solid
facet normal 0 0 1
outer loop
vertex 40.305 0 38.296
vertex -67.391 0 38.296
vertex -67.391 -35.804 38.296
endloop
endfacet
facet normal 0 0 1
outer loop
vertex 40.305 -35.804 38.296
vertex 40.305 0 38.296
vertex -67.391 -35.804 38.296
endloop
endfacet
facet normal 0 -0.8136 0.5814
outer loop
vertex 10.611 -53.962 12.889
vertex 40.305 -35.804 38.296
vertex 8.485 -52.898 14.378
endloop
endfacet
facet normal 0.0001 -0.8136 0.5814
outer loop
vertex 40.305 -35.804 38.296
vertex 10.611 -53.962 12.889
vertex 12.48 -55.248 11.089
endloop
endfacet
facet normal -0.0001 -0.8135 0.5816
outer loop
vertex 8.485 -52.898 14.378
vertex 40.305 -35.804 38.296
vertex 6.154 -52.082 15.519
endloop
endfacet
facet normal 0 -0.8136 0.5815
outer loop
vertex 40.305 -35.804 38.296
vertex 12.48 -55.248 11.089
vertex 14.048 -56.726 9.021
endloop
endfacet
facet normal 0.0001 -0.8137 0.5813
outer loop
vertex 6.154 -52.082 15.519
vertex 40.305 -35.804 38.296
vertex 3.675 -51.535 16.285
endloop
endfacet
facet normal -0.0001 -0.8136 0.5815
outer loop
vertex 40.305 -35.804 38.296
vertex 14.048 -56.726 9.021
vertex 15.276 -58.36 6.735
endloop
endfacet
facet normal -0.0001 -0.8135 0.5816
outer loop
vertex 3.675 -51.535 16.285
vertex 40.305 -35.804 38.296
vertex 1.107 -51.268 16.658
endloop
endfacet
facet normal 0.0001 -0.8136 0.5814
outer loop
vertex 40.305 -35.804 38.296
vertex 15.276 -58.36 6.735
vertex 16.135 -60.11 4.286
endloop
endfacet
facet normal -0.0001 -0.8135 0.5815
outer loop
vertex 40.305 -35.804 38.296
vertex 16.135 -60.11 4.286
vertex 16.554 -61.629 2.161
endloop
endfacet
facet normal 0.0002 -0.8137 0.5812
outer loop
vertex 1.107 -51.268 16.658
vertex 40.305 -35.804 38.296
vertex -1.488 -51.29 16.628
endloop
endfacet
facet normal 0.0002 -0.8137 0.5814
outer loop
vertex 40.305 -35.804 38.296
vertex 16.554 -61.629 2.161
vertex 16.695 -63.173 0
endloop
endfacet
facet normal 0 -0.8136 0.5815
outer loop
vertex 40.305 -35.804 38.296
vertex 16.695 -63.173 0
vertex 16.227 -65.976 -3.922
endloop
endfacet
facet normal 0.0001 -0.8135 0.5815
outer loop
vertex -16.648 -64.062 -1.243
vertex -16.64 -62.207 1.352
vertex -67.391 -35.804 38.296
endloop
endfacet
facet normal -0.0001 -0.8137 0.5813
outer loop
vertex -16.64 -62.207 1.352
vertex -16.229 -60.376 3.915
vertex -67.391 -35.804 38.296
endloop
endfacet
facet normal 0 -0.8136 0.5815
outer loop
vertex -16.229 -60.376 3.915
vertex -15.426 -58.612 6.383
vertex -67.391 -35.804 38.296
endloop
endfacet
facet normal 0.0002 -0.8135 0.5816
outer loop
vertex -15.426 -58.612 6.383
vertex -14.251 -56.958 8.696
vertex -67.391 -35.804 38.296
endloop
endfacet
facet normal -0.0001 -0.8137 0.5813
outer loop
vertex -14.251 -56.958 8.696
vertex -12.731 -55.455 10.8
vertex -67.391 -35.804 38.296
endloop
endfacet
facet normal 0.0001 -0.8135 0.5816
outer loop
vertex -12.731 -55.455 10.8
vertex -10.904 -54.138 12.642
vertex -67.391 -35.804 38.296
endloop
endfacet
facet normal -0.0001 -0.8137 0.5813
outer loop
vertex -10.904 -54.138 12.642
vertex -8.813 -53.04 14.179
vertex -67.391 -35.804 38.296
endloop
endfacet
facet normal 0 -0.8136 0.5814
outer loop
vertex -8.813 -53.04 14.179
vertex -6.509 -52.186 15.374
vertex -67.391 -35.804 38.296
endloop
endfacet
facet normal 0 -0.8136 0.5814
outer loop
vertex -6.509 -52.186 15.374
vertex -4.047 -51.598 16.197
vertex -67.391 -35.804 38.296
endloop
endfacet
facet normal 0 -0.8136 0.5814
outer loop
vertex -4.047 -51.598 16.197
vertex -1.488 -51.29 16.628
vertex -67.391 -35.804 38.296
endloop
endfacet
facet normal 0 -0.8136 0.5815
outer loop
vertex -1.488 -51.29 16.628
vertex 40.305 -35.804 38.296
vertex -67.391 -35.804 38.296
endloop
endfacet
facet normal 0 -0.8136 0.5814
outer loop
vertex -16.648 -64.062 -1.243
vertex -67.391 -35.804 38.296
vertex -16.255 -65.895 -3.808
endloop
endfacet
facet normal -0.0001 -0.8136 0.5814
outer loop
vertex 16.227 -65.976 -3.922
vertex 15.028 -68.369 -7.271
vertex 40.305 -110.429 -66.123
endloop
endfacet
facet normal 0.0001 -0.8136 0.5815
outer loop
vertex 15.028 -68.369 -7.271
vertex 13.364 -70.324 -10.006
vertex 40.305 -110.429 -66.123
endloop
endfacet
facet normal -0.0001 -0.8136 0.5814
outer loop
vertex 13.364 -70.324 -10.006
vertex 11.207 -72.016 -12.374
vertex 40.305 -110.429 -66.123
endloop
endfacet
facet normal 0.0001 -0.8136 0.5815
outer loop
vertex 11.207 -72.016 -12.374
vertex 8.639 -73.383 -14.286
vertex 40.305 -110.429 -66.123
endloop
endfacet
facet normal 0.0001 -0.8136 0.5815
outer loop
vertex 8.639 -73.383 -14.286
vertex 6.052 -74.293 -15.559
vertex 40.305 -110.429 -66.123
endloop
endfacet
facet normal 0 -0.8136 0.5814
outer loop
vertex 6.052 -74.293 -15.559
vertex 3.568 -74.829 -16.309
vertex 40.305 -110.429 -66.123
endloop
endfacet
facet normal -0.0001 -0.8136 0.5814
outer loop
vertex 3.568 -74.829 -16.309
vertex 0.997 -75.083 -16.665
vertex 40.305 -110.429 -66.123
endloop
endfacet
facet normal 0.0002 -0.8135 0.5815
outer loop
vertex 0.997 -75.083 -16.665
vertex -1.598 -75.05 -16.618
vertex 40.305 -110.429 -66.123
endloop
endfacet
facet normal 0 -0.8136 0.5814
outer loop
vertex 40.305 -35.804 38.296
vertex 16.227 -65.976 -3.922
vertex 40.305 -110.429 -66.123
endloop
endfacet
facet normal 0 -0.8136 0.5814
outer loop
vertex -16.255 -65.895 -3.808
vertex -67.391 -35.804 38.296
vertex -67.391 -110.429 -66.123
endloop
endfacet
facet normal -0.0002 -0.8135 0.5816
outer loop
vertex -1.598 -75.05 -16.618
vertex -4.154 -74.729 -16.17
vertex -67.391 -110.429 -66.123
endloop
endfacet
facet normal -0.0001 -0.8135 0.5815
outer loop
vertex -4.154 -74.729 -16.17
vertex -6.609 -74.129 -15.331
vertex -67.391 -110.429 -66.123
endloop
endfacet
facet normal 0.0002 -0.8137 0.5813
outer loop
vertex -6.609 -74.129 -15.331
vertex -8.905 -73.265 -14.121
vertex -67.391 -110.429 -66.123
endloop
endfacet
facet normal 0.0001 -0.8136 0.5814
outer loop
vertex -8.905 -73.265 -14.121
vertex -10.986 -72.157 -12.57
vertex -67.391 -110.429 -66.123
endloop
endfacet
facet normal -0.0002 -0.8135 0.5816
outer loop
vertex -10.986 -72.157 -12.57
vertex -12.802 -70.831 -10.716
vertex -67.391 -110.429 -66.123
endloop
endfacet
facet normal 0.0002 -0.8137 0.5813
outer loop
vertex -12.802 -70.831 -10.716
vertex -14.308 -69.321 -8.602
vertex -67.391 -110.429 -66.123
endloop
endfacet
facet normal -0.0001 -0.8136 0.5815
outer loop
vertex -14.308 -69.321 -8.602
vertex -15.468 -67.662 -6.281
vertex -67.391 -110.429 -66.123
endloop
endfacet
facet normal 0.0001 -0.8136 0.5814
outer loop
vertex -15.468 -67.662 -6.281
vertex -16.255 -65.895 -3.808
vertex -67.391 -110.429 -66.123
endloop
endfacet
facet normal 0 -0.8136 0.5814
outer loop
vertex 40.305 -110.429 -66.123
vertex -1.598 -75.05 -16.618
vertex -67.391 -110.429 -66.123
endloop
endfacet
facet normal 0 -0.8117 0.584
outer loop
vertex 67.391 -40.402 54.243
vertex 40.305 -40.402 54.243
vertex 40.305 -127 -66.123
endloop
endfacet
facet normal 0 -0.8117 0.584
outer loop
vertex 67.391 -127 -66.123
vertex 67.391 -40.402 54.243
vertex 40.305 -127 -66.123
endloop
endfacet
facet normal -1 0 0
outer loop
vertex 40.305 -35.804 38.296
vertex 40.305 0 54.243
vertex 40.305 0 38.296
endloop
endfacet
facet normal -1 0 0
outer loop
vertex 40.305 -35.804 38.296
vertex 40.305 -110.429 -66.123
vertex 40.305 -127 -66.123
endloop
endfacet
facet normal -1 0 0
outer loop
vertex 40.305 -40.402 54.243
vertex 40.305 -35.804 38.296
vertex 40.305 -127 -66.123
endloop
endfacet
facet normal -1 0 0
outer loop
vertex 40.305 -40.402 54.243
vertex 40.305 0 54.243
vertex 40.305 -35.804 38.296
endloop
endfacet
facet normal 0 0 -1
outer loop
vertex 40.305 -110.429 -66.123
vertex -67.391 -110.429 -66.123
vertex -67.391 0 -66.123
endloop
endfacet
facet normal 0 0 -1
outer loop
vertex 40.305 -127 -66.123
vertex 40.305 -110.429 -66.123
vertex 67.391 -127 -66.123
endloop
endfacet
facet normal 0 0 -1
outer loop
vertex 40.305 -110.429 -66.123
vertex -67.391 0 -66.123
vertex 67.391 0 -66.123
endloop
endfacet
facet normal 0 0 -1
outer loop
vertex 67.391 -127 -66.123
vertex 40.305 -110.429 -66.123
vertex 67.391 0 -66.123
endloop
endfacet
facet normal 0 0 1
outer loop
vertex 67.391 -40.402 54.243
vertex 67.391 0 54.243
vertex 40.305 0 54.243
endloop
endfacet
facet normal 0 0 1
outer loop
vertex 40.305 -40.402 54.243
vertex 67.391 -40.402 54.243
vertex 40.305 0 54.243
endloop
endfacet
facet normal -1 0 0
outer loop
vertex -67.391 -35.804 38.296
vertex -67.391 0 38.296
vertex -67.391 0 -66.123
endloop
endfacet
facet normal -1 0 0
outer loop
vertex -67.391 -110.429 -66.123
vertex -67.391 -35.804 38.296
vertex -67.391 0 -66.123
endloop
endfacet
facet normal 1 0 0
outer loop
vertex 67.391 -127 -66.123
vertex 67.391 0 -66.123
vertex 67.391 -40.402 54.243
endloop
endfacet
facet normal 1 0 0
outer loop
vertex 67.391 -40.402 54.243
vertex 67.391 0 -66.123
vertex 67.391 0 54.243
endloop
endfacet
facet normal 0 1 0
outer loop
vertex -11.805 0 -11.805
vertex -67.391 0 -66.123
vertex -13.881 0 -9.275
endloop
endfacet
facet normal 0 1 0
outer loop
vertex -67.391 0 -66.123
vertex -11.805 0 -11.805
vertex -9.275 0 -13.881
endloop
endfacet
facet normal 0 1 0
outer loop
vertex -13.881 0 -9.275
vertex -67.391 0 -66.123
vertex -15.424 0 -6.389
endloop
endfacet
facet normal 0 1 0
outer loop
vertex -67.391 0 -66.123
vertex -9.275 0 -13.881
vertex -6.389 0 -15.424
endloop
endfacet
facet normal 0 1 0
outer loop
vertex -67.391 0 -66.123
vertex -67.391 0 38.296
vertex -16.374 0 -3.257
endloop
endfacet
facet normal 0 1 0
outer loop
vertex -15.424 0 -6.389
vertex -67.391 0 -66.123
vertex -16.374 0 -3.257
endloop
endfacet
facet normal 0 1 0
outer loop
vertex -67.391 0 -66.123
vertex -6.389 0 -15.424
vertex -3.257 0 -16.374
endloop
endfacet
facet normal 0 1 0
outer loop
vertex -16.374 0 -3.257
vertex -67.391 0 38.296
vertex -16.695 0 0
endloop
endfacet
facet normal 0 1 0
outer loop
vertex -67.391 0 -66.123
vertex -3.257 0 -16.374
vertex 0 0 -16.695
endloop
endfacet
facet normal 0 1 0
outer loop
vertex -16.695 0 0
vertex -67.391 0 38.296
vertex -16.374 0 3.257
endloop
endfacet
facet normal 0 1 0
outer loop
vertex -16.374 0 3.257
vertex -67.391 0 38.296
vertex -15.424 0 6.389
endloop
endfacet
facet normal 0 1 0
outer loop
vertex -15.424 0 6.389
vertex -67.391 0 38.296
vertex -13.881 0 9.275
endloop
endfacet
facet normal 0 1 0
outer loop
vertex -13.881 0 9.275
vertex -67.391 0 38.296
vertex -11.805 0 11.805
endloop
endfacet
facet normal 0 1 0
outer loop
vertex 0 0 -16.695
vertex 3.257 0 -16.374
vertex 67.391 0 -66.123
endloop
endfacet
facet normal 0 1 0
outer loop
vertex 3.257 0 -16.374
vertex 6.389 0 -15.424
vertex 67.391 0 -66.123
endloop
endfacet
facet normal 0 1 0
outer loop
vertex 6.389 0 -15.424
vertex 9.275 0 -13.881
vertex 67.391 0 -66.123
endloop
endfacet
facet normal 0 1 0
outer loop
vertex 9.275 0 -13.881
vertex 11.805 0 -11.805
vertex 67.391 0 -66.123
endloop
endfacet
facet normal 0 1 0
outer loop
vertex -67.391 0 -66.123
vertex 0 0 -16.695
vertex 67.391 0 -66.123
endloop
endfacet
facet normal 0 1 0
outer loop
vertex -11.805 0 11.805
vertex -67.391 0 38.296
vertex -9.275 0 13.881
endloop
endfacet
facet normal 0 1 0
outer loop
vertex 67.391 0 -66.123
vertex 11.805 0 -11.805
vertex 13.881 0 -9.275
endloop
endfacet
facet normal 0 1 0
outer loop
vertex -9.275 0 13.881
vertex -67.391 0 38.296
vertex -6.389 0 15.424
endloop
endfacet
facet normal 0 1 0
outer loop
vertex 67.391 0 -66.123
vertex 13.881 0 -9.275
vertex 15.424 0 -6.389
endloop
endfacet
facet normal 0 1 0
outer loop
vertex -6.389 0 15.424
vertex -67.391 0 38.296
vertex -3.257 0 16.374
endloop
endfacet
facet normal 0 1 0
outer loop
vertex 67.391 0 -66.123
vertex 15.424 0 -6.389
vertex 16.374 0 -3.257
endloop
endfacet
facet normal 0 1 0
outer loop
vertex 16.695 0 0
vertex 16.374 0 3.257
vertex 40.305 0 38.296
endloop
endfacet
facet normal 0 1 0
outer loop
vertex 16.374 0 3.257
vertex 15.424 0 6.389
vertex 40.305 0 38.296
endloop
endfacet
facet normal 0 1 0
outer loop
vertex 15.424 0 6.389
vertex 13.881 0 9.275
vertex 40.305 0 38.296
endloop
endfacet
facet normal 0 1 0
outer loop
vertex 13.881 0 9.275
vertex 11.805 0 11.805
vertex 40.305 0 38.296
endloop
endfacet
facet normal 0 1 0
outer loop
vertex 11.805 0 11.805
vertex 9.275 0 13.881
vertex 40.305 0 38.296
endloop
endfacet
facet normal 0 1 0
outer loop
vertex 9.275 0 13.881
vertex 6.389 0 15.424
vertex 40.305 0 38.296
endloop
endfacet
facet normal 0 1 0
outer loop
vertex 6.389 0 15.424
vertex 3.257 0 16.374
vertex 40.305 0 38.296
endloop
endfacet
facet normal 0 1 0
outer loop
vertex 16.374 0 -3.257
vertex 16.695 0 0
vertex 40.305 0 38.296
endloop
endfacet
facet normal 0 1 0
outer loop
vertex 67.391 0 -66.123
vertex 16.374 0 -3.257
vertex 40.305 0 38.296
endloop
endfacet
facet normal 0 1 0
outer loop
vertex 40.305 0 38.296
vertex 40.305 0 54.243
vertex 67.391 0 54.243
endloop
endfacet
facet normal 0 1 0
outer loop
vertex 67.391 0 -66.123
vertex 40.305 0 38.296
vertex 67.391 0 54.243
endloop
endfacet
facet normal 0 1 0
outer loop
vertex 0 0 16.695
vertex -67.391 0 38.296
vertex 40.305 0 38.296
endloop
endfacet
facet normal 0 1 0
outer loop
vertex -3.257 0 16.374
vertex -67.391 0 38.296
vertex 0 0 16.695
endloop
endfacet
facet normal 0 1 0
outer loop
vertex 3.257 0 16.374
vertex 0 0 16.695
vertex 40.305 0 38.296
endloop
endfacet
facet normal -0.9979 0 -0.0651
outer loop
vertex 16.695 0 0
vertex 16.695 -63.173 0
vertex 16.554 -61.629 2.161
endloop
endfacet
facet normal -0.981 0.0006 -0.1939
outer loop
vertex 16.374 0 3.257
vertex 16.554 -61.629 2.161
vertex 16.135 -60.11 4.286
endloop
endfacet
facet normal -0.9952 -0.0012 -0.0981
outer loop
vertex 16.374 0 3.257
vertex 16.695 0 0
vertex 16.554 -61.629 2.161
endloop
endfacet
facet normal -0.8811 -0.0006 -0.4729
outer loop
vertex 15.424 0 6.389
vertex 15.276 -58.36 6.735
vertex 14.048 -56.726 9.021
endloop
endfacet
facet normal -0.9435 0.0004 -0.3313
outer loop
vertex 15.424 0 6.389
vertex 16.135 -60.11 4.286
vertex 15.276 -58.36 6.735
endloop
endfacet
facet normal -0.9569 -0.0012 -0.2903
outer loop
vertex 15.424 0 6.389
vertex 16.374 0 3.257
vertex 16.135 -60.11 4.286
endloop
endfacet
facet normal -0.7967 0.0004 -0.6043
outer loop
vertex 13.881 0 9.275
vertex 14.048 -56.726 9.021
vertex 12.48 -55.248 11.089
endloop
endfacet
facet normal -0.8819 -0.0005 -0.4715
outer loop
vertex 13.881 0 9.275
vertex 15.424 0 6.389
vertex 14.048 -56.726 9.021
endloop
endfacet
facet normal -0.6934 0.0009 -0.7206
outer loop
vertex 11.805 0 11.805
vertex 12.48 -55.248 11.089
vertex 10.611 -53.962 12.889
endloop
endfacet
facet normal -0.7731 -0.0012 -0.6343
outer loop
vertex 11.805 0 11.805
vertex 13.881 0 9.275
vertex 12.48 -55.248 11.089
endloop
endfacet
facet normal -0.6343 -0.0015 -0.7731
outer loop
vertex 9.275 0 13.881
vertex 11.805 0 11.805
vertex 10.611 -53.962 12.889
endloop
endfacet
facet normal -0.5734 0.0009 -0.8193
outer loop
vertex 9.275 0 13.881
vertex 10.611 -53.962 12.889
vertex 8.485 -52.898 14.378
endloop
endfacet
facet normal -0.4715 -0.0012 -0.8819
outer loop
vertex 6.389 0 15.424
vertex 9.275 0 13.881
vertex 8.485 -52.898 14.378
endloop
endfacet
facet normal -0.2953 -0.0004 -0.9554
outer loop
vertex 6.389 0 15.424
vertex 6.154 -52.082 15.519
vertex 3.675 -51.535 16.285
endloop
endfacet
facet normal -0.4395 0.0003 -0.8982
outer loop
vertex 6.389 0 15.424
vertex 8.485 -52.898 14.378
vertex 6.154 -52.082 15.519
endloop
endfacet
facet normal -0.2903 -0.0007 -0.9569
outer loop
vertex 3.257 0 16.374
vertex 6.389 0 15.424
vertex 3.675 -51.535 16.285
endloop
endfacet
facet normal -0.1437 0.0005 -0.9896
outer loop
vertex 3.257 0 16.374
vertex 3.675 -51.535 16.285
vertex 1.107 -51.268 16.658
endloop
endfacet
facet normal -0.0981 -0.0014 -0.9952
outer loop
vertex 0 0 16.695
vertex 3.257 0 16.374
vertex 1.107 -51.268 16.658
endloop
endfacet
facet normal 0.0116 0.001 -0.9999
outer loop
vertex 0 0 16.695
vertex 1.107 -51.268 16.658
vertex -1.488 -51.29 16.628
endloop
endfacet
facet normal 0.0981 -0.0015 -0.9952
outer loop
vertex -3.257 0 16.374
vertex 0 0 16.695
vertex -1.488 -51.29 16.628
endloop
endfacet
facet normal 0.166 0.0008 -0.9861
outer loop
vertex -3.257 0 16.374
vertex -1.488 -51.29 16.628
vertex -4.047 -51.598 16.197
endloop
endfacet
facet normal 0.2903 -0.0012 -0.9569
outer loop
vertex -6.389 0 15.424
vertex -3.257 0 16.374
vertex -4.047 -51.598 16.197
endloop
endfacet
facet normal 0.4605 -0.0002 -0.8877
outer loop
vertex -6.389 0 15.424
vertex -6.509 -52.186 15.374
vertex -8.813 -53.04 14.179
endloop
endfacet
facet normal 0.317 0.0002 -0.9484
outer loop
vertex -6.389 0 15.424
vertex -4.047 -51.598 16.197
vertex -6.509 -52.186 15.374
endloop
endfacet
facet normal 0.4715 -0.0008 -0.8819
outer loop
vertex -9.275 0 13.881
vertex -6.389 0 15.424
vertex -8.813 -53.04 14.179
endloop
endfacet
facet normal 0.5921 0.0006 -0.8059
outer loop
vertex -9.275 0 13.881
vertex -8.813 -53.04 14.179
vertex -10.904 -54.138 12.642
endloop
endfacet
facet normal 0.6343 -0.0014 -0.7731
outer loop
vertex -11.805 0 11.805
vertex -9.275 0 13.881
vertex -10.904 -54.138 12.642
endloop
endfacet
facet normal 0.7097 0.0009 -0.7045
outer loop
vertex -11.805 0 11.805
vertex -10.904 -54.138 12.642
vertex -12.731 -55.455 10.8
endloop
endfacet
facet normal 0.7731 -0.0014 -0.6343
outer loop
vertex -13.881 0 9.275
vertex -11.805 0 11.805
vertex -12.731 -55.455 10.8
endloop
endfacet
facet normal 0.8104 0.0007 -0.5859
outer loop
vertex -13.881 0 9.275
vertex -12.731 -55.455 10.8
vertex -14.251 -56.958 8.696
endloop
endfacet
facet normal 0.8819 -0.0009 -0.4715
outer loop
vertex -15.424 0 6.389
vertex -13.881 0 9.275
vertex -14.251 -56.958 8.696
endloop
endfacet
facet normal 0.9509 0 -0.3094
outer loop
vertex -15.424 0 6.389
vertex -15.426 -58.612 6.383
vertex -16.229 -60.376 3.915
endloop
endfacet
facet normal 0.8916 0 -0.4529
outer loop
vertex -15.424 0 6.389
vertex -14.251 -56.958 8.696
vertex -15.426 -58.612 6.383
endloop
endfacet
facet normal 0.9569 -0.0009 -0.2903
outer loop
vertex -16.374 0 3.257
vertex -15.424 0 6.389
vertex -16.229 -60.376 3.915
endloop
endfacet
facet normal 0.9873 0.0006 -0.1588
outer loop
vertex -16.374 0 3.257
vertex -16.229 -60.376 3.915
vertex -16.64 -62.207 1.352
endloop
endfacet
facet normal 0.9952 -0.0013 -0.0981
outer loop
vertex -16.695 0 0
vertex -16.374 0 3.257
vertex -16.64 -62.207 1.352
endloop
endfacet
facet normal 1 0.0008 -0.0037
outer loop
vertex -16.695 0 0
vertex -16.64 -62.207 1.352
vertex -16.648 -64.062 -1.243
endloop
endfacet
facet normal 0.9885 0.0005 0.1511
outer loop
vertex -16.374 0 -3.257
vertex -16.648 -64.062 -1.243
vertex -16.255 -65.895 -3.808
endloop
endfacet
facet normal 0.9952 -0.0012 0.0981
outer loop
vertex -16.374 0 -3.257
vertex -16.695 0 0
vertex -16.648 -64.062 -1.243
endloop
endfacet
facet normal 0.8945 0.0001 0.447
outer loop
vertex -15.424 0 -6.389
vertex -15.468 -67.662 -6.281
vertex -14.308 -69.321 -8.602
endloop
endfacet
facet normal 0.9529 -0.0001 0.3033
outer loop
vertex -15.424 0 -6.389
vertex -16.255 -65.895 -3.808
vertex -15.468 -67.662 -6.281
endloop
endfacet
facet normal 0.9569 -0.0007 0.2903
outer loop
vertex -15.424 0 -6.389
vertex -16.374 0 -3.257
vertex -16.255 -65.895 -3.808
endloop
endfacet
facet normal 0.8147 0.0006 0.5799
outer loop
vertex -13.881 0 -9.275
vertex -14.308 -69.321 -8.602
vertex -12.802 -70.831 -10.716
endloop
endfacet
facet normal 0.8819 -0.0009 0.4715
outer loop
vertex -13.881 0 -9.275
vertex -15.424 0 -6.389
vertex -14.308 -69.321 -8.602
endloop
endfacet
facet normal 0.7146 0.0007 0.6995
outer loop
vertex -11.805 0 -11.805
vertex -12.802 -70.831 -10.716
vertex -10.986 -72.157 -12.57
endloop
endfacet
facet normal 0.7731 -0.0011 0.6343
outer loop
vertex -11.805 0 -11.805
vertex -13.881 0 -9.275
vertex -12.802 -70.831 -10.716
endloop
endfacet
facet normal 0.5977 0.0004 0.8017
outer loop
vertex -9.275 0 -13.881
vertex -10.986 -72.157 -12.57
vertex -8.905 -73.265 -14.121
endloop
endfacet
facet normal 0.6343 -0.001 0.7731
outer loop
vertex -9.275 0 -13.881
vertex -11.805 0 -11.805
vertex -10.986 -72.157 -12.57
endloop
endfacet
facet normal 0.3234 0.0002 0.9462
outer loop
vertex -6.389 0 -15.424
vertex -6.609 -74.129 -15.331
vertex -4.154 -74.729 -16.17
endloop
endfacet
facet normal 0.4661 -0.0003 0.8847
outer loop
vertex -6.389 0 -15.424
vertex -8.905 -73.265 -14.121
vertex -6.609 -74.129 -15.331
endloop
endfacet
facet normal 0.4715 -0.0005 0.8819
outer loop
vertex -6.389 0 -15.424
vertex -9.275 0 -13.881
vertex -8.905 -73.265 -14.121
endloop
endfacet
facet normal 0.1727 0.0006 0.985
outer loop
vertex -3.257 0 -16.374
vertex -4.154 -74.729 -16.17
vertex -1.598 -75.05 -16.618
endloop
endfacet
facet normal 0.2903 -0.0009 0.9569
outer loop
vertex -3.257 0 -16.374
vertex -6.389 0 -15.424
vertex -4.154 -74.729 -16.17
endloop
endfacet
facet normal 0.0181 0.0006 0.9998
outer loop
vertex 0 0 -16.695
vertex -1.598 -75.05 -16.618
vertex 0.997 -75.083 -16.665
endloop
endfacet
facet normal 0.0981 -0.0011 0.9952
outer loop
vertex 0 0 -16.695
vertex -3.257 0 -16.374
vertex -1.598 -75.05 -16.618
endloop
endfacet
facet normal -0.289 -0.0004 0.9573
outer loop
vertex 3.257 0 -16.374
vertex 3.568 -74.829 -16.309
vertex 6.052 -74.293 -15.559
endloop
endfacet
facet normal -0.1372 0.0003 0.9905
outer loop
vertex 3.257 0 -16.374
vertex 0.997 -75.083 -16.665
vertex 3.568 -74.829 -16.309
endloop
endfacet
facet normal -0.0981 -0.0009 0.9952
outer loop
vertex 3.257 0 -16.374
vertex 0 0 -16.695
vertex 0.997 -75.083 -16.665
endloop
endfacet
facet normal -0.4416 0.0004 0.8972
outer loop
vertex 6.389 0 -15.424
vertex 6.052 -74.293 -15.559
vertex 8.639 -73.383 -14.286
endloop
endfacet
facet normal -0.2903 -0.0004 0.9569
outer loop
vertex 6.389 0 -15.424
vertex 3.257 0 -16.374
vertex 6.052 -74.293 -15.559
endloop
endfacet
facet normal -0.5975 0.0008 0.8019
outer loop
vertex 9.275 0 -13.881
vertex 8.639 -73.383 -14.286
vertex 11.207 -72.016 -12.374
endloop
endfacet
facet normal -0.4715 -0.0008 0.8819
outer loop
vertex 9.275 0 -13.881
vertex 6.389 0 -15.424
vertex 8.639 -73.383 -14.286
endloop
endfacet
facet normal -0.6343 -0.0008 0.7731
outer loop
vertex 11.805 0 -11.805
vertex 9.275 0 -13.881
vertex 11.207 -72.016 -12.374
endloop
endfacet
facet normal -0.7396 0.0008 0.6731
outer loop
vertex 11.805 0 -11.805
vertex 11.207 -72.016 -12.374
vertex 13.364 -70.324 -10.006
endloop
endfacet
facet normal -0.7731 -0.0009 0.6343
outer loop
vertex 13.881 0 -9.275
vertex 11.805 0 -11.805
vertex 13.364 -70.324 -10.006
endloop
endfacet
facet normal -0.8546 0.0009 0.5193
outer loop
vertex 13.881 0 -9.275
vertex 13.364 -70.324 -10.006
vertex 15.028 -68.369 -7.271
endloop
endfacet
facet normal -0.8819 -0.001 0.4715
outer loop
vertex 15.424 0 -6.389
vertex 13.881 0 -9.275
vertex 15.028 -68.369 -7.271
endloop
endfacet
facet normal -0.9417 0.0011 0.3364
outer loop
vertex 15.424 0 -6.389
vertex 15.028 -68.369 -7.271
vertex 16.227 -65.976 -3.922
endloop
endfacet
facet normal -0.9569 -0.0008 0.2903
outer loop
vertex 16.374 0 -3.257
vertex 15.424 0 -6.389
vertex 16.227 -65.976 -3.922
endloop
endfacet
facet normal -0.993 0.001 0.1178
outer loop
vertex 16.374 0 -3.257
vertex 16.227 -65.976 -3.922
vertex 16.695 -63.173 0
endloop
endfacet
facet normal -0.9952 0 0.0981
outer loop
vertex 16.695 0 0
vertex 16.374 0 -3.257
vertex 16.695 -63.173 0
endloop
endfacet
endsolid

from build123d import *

# Parameters (mm, degrees)
F0_R     = 16.69467
F1_DEPTH = 127
F3_DEPTH = 136.144
F5_DEPTH = 107.696


with BuildPart() as f1:
    # F0 (on Front) → F1 (new body)
    with BuildSketch(Plane.XZ):
        Polygon((67.391418, 54.243322), (0, 54.243322), (-67.391418, 54.243322), (-67.391418, -66.123113), (0, -66.123113), (67.391418, -66.123113), align=None)
        Circle(F0_R, mode=Mode.SUBTRACT)
    extrude(amount=F1_DEPTH)

    # F2 (on face) → F3 (cut)
    with BuildSketch(Plane(origin=(-67.391418, 0, 0), x_dir=(0, -1, 0), z_dir=(-1, 0, 0))):
        Polygon((127, 54.243322), (40.401872, 54.243322), (127, -66.123113), align=None)
    extrude(amount=-F3_DEPTH, mode=Mode.SUBTRACT)

    # F4 (on face) → F5 (cut)
    with BuildSketch(Plane(origin=(-67.391418, 0, 0), x_dir=(0, -1, 0), z_dir=(-1, 0, 0))):
        Polygon((0, 54.243322), (0, 38.296405), (35.804231, 38.296405), (110.428944, -66.123113), (127, -66.123113), (40.401872, 54.243322), align=None)
    extrude(amount=-F5_DEPTH, mode=Mode.SUBTRACT)


solid = f1.part
